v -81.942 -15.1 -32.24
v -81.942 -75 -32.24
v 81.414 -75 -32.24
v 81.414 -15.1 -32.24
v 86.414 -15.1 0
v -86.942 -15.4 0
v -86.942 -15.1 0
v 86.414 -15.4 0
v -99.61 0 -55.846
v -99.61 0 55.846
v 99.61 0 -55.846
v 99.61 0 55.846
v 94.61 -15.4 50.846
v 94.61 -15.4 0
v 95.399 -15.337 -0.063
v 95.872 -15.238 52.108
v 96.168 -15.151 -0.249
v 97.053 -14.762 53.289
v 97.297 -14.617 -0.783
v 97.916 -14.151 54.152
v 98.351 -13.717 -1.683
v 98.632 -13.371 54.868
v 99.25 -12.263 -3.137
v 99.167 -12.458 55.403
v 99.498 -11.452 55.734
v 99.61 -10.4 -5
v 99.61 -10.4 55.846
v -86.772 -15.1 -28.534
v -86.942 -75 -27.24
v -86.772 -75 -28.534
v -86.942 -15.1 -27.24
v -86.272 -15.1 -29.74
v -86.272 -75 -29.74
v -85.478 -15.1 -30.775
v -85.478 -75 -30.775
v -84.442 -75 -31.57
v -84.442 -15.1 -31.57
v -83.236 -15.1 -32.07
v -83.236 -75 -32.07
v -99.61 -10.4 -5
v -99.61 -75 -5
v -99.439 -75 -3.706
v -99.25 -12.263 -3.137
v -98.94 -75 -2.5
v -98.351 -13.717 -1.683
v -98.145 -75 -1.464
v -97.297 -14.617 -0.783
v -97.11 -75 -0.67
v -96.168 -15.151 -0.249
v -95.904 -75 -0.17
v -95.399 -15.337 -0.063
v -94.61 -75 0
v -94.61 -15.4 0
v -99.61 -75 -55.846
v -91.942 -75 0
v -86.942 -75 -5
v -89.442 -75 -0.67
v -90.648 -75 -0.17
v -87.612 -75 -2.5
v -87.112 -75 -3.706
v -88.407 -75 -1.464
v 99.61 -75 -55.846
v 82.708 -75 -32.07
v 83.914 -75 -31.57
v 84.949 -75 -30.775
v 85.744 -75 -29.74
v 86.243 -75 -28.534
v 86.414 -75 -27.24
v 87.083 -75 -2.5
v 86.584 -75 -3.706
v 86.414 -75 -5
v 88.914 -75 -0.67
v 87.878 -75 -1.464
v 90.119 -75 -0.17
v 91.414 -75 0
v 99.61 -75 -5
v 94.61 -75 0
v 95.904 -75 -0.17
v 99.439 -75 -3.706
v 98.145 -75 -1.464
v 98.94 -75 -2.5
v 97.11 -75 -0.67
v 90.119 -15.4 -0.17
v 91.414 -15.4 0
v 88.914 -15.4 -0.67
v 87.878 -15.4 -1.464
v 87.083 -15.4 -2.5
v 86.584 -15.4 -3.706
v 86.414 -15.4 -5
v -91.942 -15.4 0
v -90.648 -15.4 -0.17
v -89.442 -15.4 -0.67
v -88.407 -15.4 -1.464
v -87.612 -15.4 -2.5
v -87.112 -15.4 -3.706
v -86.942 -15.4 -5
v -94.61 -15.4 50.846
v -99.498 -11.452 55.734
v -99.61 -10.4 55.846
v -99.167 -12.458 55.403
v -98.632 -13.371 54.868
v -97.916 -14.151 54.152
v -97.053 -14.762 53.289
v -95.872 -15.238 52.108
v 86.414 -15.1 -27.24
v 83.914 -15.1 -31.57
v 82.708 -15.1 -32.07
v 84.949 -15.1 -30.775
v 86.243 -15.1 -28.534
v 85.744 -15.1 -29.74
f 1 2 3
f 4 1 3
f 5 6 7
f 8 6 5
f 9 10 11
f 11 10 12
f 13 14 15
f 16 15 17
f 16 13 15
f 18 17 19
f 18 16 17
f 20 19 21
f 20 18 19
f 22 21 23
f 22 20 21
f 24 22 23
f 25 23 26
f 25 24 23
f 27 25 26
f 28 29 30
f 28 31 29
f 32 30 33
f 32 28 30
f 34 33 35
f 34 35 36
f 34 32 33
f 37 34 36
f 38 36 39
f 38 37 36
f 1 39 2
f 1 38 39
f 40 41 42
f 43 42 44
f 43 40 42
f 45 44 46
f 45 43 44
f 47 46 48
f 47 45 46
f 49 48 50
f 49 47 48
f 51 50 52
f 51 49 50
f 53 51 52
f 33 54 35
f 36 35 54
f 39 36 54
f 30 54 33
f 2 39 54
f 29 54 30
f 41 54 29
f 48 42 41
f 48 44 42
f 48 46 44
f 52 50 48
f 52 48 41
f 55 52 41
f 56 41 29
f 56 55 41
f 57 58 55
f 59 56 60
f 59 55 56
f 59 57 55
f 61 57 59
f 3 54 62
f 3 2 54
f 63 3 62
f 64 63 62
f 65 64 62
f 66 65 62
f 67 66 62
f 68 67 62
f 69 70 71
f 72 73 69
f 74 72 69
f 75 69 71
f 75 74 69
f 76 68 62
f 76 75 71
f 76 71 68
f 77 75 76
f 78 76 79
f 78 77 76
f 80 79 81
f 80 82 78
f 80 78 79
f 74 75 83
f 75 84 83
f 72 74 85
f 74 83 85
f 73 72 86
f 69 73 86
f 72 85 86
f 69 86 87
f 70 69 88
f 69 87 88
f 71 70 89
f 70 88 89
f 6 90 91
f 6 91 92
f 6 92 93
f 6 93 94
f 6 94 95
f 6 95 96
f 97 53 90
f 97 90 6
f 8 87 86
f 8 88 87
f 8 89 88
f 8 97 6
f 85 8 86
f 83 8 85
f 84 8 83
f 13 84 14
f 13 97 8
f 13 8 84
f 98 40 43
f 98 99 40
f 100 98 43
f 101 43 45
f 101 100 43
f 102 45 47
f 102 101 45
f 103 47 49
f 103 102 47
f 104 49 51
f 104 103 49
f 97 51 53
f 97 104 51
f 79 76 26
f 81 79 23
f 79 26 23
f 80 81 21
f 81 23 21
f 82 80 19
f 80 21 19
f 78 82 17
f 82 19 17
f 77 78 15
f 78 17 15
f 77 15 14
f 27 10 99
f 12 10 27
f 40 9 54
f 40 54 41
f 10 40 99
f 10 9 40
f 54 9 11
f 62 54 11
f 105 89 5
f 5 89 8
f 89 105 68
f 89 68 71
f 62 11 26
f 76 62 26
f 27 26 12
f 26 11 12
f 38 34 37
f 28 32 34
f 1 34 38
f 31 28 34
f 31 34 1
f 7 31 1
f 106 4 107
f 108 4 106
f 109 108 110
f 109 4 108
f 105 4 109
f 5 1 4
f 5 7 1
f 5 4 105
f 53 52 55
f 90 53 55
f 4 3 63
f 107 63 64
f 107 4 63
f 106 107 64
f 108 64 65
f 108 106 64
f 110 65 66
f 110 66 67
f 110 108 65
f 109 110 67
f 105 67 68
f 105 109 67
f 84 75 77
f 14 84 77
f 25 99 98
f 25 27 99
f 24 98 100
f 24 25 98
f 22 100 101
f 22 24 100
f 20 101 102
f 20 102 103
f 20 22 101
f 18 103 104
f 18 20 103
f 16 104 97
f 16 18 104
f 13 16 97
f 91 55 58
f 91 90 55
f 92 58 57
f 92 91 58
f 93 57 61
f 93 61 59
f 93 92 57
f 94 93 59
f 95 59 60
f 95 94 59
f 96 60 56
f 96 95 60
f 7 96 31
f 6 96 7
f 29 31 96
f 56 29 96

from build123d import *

# Parameters (mm, degrees)
F0_W     = 199.2195397615
F0_H     = 111.6918176413
F1_DEPTH = 75
F2_W     = 199.2195397615
F2_H     = 55.8459088206
F3_DEPTH = 59.6
F4_W     = 173.3557134867
F4_H     = 32.2399325669
F5_DEPTH = 59.9
F6_R     = 5


with BuildPart() as f1:
    # F0 (on Front) → F1 (new body)
    with BuildSketch(Plane.XZ):
        Rectangle(F0_W, F0_H)
    extrude(amount=F1_DEPTH)

    # F2 (on face) → F3 (cut)
    with BuildSketch(Plane.XZ.offset(75)):
        with Locations((0, 27.9229544103)):
            Rectangle(F2_W, F2_H)
    extrude(amount=-F3_DEPTH, mode=Mode.SUBTRACT)

    # F4 (on face) → F5 (cut)
    with BuildSketch(Plane.XZ.offset(75)):
        with Locations((-0.2642646432, -16.1199662834)):
            Rectangle(F4_W, F4_H)
    extrude(amount=-F5_DEPTH, mode=Mode.SUBTRACT)

    # F6
    f6_edges = [f1.edges().sort_by_distance(p)[0] for p in [
        (-99.60977, -45.2, 0),
        (-86.942121, -45.2, 0),
        (-86.942121, -45.05, -32.239933),
        (86.413592, -45.05, -32.239933),
        (86.413592, -45.2, 0),
        (99.60977, -45.2, 0),
        (-99.60977, -15.4, 27.922954),
        (0, -15.4, 55.845909),
        (99.60977, -15.4, 27.922954),
    ]]
    fillet(f6_edges, radius=F6_R)


solid = f1.part
